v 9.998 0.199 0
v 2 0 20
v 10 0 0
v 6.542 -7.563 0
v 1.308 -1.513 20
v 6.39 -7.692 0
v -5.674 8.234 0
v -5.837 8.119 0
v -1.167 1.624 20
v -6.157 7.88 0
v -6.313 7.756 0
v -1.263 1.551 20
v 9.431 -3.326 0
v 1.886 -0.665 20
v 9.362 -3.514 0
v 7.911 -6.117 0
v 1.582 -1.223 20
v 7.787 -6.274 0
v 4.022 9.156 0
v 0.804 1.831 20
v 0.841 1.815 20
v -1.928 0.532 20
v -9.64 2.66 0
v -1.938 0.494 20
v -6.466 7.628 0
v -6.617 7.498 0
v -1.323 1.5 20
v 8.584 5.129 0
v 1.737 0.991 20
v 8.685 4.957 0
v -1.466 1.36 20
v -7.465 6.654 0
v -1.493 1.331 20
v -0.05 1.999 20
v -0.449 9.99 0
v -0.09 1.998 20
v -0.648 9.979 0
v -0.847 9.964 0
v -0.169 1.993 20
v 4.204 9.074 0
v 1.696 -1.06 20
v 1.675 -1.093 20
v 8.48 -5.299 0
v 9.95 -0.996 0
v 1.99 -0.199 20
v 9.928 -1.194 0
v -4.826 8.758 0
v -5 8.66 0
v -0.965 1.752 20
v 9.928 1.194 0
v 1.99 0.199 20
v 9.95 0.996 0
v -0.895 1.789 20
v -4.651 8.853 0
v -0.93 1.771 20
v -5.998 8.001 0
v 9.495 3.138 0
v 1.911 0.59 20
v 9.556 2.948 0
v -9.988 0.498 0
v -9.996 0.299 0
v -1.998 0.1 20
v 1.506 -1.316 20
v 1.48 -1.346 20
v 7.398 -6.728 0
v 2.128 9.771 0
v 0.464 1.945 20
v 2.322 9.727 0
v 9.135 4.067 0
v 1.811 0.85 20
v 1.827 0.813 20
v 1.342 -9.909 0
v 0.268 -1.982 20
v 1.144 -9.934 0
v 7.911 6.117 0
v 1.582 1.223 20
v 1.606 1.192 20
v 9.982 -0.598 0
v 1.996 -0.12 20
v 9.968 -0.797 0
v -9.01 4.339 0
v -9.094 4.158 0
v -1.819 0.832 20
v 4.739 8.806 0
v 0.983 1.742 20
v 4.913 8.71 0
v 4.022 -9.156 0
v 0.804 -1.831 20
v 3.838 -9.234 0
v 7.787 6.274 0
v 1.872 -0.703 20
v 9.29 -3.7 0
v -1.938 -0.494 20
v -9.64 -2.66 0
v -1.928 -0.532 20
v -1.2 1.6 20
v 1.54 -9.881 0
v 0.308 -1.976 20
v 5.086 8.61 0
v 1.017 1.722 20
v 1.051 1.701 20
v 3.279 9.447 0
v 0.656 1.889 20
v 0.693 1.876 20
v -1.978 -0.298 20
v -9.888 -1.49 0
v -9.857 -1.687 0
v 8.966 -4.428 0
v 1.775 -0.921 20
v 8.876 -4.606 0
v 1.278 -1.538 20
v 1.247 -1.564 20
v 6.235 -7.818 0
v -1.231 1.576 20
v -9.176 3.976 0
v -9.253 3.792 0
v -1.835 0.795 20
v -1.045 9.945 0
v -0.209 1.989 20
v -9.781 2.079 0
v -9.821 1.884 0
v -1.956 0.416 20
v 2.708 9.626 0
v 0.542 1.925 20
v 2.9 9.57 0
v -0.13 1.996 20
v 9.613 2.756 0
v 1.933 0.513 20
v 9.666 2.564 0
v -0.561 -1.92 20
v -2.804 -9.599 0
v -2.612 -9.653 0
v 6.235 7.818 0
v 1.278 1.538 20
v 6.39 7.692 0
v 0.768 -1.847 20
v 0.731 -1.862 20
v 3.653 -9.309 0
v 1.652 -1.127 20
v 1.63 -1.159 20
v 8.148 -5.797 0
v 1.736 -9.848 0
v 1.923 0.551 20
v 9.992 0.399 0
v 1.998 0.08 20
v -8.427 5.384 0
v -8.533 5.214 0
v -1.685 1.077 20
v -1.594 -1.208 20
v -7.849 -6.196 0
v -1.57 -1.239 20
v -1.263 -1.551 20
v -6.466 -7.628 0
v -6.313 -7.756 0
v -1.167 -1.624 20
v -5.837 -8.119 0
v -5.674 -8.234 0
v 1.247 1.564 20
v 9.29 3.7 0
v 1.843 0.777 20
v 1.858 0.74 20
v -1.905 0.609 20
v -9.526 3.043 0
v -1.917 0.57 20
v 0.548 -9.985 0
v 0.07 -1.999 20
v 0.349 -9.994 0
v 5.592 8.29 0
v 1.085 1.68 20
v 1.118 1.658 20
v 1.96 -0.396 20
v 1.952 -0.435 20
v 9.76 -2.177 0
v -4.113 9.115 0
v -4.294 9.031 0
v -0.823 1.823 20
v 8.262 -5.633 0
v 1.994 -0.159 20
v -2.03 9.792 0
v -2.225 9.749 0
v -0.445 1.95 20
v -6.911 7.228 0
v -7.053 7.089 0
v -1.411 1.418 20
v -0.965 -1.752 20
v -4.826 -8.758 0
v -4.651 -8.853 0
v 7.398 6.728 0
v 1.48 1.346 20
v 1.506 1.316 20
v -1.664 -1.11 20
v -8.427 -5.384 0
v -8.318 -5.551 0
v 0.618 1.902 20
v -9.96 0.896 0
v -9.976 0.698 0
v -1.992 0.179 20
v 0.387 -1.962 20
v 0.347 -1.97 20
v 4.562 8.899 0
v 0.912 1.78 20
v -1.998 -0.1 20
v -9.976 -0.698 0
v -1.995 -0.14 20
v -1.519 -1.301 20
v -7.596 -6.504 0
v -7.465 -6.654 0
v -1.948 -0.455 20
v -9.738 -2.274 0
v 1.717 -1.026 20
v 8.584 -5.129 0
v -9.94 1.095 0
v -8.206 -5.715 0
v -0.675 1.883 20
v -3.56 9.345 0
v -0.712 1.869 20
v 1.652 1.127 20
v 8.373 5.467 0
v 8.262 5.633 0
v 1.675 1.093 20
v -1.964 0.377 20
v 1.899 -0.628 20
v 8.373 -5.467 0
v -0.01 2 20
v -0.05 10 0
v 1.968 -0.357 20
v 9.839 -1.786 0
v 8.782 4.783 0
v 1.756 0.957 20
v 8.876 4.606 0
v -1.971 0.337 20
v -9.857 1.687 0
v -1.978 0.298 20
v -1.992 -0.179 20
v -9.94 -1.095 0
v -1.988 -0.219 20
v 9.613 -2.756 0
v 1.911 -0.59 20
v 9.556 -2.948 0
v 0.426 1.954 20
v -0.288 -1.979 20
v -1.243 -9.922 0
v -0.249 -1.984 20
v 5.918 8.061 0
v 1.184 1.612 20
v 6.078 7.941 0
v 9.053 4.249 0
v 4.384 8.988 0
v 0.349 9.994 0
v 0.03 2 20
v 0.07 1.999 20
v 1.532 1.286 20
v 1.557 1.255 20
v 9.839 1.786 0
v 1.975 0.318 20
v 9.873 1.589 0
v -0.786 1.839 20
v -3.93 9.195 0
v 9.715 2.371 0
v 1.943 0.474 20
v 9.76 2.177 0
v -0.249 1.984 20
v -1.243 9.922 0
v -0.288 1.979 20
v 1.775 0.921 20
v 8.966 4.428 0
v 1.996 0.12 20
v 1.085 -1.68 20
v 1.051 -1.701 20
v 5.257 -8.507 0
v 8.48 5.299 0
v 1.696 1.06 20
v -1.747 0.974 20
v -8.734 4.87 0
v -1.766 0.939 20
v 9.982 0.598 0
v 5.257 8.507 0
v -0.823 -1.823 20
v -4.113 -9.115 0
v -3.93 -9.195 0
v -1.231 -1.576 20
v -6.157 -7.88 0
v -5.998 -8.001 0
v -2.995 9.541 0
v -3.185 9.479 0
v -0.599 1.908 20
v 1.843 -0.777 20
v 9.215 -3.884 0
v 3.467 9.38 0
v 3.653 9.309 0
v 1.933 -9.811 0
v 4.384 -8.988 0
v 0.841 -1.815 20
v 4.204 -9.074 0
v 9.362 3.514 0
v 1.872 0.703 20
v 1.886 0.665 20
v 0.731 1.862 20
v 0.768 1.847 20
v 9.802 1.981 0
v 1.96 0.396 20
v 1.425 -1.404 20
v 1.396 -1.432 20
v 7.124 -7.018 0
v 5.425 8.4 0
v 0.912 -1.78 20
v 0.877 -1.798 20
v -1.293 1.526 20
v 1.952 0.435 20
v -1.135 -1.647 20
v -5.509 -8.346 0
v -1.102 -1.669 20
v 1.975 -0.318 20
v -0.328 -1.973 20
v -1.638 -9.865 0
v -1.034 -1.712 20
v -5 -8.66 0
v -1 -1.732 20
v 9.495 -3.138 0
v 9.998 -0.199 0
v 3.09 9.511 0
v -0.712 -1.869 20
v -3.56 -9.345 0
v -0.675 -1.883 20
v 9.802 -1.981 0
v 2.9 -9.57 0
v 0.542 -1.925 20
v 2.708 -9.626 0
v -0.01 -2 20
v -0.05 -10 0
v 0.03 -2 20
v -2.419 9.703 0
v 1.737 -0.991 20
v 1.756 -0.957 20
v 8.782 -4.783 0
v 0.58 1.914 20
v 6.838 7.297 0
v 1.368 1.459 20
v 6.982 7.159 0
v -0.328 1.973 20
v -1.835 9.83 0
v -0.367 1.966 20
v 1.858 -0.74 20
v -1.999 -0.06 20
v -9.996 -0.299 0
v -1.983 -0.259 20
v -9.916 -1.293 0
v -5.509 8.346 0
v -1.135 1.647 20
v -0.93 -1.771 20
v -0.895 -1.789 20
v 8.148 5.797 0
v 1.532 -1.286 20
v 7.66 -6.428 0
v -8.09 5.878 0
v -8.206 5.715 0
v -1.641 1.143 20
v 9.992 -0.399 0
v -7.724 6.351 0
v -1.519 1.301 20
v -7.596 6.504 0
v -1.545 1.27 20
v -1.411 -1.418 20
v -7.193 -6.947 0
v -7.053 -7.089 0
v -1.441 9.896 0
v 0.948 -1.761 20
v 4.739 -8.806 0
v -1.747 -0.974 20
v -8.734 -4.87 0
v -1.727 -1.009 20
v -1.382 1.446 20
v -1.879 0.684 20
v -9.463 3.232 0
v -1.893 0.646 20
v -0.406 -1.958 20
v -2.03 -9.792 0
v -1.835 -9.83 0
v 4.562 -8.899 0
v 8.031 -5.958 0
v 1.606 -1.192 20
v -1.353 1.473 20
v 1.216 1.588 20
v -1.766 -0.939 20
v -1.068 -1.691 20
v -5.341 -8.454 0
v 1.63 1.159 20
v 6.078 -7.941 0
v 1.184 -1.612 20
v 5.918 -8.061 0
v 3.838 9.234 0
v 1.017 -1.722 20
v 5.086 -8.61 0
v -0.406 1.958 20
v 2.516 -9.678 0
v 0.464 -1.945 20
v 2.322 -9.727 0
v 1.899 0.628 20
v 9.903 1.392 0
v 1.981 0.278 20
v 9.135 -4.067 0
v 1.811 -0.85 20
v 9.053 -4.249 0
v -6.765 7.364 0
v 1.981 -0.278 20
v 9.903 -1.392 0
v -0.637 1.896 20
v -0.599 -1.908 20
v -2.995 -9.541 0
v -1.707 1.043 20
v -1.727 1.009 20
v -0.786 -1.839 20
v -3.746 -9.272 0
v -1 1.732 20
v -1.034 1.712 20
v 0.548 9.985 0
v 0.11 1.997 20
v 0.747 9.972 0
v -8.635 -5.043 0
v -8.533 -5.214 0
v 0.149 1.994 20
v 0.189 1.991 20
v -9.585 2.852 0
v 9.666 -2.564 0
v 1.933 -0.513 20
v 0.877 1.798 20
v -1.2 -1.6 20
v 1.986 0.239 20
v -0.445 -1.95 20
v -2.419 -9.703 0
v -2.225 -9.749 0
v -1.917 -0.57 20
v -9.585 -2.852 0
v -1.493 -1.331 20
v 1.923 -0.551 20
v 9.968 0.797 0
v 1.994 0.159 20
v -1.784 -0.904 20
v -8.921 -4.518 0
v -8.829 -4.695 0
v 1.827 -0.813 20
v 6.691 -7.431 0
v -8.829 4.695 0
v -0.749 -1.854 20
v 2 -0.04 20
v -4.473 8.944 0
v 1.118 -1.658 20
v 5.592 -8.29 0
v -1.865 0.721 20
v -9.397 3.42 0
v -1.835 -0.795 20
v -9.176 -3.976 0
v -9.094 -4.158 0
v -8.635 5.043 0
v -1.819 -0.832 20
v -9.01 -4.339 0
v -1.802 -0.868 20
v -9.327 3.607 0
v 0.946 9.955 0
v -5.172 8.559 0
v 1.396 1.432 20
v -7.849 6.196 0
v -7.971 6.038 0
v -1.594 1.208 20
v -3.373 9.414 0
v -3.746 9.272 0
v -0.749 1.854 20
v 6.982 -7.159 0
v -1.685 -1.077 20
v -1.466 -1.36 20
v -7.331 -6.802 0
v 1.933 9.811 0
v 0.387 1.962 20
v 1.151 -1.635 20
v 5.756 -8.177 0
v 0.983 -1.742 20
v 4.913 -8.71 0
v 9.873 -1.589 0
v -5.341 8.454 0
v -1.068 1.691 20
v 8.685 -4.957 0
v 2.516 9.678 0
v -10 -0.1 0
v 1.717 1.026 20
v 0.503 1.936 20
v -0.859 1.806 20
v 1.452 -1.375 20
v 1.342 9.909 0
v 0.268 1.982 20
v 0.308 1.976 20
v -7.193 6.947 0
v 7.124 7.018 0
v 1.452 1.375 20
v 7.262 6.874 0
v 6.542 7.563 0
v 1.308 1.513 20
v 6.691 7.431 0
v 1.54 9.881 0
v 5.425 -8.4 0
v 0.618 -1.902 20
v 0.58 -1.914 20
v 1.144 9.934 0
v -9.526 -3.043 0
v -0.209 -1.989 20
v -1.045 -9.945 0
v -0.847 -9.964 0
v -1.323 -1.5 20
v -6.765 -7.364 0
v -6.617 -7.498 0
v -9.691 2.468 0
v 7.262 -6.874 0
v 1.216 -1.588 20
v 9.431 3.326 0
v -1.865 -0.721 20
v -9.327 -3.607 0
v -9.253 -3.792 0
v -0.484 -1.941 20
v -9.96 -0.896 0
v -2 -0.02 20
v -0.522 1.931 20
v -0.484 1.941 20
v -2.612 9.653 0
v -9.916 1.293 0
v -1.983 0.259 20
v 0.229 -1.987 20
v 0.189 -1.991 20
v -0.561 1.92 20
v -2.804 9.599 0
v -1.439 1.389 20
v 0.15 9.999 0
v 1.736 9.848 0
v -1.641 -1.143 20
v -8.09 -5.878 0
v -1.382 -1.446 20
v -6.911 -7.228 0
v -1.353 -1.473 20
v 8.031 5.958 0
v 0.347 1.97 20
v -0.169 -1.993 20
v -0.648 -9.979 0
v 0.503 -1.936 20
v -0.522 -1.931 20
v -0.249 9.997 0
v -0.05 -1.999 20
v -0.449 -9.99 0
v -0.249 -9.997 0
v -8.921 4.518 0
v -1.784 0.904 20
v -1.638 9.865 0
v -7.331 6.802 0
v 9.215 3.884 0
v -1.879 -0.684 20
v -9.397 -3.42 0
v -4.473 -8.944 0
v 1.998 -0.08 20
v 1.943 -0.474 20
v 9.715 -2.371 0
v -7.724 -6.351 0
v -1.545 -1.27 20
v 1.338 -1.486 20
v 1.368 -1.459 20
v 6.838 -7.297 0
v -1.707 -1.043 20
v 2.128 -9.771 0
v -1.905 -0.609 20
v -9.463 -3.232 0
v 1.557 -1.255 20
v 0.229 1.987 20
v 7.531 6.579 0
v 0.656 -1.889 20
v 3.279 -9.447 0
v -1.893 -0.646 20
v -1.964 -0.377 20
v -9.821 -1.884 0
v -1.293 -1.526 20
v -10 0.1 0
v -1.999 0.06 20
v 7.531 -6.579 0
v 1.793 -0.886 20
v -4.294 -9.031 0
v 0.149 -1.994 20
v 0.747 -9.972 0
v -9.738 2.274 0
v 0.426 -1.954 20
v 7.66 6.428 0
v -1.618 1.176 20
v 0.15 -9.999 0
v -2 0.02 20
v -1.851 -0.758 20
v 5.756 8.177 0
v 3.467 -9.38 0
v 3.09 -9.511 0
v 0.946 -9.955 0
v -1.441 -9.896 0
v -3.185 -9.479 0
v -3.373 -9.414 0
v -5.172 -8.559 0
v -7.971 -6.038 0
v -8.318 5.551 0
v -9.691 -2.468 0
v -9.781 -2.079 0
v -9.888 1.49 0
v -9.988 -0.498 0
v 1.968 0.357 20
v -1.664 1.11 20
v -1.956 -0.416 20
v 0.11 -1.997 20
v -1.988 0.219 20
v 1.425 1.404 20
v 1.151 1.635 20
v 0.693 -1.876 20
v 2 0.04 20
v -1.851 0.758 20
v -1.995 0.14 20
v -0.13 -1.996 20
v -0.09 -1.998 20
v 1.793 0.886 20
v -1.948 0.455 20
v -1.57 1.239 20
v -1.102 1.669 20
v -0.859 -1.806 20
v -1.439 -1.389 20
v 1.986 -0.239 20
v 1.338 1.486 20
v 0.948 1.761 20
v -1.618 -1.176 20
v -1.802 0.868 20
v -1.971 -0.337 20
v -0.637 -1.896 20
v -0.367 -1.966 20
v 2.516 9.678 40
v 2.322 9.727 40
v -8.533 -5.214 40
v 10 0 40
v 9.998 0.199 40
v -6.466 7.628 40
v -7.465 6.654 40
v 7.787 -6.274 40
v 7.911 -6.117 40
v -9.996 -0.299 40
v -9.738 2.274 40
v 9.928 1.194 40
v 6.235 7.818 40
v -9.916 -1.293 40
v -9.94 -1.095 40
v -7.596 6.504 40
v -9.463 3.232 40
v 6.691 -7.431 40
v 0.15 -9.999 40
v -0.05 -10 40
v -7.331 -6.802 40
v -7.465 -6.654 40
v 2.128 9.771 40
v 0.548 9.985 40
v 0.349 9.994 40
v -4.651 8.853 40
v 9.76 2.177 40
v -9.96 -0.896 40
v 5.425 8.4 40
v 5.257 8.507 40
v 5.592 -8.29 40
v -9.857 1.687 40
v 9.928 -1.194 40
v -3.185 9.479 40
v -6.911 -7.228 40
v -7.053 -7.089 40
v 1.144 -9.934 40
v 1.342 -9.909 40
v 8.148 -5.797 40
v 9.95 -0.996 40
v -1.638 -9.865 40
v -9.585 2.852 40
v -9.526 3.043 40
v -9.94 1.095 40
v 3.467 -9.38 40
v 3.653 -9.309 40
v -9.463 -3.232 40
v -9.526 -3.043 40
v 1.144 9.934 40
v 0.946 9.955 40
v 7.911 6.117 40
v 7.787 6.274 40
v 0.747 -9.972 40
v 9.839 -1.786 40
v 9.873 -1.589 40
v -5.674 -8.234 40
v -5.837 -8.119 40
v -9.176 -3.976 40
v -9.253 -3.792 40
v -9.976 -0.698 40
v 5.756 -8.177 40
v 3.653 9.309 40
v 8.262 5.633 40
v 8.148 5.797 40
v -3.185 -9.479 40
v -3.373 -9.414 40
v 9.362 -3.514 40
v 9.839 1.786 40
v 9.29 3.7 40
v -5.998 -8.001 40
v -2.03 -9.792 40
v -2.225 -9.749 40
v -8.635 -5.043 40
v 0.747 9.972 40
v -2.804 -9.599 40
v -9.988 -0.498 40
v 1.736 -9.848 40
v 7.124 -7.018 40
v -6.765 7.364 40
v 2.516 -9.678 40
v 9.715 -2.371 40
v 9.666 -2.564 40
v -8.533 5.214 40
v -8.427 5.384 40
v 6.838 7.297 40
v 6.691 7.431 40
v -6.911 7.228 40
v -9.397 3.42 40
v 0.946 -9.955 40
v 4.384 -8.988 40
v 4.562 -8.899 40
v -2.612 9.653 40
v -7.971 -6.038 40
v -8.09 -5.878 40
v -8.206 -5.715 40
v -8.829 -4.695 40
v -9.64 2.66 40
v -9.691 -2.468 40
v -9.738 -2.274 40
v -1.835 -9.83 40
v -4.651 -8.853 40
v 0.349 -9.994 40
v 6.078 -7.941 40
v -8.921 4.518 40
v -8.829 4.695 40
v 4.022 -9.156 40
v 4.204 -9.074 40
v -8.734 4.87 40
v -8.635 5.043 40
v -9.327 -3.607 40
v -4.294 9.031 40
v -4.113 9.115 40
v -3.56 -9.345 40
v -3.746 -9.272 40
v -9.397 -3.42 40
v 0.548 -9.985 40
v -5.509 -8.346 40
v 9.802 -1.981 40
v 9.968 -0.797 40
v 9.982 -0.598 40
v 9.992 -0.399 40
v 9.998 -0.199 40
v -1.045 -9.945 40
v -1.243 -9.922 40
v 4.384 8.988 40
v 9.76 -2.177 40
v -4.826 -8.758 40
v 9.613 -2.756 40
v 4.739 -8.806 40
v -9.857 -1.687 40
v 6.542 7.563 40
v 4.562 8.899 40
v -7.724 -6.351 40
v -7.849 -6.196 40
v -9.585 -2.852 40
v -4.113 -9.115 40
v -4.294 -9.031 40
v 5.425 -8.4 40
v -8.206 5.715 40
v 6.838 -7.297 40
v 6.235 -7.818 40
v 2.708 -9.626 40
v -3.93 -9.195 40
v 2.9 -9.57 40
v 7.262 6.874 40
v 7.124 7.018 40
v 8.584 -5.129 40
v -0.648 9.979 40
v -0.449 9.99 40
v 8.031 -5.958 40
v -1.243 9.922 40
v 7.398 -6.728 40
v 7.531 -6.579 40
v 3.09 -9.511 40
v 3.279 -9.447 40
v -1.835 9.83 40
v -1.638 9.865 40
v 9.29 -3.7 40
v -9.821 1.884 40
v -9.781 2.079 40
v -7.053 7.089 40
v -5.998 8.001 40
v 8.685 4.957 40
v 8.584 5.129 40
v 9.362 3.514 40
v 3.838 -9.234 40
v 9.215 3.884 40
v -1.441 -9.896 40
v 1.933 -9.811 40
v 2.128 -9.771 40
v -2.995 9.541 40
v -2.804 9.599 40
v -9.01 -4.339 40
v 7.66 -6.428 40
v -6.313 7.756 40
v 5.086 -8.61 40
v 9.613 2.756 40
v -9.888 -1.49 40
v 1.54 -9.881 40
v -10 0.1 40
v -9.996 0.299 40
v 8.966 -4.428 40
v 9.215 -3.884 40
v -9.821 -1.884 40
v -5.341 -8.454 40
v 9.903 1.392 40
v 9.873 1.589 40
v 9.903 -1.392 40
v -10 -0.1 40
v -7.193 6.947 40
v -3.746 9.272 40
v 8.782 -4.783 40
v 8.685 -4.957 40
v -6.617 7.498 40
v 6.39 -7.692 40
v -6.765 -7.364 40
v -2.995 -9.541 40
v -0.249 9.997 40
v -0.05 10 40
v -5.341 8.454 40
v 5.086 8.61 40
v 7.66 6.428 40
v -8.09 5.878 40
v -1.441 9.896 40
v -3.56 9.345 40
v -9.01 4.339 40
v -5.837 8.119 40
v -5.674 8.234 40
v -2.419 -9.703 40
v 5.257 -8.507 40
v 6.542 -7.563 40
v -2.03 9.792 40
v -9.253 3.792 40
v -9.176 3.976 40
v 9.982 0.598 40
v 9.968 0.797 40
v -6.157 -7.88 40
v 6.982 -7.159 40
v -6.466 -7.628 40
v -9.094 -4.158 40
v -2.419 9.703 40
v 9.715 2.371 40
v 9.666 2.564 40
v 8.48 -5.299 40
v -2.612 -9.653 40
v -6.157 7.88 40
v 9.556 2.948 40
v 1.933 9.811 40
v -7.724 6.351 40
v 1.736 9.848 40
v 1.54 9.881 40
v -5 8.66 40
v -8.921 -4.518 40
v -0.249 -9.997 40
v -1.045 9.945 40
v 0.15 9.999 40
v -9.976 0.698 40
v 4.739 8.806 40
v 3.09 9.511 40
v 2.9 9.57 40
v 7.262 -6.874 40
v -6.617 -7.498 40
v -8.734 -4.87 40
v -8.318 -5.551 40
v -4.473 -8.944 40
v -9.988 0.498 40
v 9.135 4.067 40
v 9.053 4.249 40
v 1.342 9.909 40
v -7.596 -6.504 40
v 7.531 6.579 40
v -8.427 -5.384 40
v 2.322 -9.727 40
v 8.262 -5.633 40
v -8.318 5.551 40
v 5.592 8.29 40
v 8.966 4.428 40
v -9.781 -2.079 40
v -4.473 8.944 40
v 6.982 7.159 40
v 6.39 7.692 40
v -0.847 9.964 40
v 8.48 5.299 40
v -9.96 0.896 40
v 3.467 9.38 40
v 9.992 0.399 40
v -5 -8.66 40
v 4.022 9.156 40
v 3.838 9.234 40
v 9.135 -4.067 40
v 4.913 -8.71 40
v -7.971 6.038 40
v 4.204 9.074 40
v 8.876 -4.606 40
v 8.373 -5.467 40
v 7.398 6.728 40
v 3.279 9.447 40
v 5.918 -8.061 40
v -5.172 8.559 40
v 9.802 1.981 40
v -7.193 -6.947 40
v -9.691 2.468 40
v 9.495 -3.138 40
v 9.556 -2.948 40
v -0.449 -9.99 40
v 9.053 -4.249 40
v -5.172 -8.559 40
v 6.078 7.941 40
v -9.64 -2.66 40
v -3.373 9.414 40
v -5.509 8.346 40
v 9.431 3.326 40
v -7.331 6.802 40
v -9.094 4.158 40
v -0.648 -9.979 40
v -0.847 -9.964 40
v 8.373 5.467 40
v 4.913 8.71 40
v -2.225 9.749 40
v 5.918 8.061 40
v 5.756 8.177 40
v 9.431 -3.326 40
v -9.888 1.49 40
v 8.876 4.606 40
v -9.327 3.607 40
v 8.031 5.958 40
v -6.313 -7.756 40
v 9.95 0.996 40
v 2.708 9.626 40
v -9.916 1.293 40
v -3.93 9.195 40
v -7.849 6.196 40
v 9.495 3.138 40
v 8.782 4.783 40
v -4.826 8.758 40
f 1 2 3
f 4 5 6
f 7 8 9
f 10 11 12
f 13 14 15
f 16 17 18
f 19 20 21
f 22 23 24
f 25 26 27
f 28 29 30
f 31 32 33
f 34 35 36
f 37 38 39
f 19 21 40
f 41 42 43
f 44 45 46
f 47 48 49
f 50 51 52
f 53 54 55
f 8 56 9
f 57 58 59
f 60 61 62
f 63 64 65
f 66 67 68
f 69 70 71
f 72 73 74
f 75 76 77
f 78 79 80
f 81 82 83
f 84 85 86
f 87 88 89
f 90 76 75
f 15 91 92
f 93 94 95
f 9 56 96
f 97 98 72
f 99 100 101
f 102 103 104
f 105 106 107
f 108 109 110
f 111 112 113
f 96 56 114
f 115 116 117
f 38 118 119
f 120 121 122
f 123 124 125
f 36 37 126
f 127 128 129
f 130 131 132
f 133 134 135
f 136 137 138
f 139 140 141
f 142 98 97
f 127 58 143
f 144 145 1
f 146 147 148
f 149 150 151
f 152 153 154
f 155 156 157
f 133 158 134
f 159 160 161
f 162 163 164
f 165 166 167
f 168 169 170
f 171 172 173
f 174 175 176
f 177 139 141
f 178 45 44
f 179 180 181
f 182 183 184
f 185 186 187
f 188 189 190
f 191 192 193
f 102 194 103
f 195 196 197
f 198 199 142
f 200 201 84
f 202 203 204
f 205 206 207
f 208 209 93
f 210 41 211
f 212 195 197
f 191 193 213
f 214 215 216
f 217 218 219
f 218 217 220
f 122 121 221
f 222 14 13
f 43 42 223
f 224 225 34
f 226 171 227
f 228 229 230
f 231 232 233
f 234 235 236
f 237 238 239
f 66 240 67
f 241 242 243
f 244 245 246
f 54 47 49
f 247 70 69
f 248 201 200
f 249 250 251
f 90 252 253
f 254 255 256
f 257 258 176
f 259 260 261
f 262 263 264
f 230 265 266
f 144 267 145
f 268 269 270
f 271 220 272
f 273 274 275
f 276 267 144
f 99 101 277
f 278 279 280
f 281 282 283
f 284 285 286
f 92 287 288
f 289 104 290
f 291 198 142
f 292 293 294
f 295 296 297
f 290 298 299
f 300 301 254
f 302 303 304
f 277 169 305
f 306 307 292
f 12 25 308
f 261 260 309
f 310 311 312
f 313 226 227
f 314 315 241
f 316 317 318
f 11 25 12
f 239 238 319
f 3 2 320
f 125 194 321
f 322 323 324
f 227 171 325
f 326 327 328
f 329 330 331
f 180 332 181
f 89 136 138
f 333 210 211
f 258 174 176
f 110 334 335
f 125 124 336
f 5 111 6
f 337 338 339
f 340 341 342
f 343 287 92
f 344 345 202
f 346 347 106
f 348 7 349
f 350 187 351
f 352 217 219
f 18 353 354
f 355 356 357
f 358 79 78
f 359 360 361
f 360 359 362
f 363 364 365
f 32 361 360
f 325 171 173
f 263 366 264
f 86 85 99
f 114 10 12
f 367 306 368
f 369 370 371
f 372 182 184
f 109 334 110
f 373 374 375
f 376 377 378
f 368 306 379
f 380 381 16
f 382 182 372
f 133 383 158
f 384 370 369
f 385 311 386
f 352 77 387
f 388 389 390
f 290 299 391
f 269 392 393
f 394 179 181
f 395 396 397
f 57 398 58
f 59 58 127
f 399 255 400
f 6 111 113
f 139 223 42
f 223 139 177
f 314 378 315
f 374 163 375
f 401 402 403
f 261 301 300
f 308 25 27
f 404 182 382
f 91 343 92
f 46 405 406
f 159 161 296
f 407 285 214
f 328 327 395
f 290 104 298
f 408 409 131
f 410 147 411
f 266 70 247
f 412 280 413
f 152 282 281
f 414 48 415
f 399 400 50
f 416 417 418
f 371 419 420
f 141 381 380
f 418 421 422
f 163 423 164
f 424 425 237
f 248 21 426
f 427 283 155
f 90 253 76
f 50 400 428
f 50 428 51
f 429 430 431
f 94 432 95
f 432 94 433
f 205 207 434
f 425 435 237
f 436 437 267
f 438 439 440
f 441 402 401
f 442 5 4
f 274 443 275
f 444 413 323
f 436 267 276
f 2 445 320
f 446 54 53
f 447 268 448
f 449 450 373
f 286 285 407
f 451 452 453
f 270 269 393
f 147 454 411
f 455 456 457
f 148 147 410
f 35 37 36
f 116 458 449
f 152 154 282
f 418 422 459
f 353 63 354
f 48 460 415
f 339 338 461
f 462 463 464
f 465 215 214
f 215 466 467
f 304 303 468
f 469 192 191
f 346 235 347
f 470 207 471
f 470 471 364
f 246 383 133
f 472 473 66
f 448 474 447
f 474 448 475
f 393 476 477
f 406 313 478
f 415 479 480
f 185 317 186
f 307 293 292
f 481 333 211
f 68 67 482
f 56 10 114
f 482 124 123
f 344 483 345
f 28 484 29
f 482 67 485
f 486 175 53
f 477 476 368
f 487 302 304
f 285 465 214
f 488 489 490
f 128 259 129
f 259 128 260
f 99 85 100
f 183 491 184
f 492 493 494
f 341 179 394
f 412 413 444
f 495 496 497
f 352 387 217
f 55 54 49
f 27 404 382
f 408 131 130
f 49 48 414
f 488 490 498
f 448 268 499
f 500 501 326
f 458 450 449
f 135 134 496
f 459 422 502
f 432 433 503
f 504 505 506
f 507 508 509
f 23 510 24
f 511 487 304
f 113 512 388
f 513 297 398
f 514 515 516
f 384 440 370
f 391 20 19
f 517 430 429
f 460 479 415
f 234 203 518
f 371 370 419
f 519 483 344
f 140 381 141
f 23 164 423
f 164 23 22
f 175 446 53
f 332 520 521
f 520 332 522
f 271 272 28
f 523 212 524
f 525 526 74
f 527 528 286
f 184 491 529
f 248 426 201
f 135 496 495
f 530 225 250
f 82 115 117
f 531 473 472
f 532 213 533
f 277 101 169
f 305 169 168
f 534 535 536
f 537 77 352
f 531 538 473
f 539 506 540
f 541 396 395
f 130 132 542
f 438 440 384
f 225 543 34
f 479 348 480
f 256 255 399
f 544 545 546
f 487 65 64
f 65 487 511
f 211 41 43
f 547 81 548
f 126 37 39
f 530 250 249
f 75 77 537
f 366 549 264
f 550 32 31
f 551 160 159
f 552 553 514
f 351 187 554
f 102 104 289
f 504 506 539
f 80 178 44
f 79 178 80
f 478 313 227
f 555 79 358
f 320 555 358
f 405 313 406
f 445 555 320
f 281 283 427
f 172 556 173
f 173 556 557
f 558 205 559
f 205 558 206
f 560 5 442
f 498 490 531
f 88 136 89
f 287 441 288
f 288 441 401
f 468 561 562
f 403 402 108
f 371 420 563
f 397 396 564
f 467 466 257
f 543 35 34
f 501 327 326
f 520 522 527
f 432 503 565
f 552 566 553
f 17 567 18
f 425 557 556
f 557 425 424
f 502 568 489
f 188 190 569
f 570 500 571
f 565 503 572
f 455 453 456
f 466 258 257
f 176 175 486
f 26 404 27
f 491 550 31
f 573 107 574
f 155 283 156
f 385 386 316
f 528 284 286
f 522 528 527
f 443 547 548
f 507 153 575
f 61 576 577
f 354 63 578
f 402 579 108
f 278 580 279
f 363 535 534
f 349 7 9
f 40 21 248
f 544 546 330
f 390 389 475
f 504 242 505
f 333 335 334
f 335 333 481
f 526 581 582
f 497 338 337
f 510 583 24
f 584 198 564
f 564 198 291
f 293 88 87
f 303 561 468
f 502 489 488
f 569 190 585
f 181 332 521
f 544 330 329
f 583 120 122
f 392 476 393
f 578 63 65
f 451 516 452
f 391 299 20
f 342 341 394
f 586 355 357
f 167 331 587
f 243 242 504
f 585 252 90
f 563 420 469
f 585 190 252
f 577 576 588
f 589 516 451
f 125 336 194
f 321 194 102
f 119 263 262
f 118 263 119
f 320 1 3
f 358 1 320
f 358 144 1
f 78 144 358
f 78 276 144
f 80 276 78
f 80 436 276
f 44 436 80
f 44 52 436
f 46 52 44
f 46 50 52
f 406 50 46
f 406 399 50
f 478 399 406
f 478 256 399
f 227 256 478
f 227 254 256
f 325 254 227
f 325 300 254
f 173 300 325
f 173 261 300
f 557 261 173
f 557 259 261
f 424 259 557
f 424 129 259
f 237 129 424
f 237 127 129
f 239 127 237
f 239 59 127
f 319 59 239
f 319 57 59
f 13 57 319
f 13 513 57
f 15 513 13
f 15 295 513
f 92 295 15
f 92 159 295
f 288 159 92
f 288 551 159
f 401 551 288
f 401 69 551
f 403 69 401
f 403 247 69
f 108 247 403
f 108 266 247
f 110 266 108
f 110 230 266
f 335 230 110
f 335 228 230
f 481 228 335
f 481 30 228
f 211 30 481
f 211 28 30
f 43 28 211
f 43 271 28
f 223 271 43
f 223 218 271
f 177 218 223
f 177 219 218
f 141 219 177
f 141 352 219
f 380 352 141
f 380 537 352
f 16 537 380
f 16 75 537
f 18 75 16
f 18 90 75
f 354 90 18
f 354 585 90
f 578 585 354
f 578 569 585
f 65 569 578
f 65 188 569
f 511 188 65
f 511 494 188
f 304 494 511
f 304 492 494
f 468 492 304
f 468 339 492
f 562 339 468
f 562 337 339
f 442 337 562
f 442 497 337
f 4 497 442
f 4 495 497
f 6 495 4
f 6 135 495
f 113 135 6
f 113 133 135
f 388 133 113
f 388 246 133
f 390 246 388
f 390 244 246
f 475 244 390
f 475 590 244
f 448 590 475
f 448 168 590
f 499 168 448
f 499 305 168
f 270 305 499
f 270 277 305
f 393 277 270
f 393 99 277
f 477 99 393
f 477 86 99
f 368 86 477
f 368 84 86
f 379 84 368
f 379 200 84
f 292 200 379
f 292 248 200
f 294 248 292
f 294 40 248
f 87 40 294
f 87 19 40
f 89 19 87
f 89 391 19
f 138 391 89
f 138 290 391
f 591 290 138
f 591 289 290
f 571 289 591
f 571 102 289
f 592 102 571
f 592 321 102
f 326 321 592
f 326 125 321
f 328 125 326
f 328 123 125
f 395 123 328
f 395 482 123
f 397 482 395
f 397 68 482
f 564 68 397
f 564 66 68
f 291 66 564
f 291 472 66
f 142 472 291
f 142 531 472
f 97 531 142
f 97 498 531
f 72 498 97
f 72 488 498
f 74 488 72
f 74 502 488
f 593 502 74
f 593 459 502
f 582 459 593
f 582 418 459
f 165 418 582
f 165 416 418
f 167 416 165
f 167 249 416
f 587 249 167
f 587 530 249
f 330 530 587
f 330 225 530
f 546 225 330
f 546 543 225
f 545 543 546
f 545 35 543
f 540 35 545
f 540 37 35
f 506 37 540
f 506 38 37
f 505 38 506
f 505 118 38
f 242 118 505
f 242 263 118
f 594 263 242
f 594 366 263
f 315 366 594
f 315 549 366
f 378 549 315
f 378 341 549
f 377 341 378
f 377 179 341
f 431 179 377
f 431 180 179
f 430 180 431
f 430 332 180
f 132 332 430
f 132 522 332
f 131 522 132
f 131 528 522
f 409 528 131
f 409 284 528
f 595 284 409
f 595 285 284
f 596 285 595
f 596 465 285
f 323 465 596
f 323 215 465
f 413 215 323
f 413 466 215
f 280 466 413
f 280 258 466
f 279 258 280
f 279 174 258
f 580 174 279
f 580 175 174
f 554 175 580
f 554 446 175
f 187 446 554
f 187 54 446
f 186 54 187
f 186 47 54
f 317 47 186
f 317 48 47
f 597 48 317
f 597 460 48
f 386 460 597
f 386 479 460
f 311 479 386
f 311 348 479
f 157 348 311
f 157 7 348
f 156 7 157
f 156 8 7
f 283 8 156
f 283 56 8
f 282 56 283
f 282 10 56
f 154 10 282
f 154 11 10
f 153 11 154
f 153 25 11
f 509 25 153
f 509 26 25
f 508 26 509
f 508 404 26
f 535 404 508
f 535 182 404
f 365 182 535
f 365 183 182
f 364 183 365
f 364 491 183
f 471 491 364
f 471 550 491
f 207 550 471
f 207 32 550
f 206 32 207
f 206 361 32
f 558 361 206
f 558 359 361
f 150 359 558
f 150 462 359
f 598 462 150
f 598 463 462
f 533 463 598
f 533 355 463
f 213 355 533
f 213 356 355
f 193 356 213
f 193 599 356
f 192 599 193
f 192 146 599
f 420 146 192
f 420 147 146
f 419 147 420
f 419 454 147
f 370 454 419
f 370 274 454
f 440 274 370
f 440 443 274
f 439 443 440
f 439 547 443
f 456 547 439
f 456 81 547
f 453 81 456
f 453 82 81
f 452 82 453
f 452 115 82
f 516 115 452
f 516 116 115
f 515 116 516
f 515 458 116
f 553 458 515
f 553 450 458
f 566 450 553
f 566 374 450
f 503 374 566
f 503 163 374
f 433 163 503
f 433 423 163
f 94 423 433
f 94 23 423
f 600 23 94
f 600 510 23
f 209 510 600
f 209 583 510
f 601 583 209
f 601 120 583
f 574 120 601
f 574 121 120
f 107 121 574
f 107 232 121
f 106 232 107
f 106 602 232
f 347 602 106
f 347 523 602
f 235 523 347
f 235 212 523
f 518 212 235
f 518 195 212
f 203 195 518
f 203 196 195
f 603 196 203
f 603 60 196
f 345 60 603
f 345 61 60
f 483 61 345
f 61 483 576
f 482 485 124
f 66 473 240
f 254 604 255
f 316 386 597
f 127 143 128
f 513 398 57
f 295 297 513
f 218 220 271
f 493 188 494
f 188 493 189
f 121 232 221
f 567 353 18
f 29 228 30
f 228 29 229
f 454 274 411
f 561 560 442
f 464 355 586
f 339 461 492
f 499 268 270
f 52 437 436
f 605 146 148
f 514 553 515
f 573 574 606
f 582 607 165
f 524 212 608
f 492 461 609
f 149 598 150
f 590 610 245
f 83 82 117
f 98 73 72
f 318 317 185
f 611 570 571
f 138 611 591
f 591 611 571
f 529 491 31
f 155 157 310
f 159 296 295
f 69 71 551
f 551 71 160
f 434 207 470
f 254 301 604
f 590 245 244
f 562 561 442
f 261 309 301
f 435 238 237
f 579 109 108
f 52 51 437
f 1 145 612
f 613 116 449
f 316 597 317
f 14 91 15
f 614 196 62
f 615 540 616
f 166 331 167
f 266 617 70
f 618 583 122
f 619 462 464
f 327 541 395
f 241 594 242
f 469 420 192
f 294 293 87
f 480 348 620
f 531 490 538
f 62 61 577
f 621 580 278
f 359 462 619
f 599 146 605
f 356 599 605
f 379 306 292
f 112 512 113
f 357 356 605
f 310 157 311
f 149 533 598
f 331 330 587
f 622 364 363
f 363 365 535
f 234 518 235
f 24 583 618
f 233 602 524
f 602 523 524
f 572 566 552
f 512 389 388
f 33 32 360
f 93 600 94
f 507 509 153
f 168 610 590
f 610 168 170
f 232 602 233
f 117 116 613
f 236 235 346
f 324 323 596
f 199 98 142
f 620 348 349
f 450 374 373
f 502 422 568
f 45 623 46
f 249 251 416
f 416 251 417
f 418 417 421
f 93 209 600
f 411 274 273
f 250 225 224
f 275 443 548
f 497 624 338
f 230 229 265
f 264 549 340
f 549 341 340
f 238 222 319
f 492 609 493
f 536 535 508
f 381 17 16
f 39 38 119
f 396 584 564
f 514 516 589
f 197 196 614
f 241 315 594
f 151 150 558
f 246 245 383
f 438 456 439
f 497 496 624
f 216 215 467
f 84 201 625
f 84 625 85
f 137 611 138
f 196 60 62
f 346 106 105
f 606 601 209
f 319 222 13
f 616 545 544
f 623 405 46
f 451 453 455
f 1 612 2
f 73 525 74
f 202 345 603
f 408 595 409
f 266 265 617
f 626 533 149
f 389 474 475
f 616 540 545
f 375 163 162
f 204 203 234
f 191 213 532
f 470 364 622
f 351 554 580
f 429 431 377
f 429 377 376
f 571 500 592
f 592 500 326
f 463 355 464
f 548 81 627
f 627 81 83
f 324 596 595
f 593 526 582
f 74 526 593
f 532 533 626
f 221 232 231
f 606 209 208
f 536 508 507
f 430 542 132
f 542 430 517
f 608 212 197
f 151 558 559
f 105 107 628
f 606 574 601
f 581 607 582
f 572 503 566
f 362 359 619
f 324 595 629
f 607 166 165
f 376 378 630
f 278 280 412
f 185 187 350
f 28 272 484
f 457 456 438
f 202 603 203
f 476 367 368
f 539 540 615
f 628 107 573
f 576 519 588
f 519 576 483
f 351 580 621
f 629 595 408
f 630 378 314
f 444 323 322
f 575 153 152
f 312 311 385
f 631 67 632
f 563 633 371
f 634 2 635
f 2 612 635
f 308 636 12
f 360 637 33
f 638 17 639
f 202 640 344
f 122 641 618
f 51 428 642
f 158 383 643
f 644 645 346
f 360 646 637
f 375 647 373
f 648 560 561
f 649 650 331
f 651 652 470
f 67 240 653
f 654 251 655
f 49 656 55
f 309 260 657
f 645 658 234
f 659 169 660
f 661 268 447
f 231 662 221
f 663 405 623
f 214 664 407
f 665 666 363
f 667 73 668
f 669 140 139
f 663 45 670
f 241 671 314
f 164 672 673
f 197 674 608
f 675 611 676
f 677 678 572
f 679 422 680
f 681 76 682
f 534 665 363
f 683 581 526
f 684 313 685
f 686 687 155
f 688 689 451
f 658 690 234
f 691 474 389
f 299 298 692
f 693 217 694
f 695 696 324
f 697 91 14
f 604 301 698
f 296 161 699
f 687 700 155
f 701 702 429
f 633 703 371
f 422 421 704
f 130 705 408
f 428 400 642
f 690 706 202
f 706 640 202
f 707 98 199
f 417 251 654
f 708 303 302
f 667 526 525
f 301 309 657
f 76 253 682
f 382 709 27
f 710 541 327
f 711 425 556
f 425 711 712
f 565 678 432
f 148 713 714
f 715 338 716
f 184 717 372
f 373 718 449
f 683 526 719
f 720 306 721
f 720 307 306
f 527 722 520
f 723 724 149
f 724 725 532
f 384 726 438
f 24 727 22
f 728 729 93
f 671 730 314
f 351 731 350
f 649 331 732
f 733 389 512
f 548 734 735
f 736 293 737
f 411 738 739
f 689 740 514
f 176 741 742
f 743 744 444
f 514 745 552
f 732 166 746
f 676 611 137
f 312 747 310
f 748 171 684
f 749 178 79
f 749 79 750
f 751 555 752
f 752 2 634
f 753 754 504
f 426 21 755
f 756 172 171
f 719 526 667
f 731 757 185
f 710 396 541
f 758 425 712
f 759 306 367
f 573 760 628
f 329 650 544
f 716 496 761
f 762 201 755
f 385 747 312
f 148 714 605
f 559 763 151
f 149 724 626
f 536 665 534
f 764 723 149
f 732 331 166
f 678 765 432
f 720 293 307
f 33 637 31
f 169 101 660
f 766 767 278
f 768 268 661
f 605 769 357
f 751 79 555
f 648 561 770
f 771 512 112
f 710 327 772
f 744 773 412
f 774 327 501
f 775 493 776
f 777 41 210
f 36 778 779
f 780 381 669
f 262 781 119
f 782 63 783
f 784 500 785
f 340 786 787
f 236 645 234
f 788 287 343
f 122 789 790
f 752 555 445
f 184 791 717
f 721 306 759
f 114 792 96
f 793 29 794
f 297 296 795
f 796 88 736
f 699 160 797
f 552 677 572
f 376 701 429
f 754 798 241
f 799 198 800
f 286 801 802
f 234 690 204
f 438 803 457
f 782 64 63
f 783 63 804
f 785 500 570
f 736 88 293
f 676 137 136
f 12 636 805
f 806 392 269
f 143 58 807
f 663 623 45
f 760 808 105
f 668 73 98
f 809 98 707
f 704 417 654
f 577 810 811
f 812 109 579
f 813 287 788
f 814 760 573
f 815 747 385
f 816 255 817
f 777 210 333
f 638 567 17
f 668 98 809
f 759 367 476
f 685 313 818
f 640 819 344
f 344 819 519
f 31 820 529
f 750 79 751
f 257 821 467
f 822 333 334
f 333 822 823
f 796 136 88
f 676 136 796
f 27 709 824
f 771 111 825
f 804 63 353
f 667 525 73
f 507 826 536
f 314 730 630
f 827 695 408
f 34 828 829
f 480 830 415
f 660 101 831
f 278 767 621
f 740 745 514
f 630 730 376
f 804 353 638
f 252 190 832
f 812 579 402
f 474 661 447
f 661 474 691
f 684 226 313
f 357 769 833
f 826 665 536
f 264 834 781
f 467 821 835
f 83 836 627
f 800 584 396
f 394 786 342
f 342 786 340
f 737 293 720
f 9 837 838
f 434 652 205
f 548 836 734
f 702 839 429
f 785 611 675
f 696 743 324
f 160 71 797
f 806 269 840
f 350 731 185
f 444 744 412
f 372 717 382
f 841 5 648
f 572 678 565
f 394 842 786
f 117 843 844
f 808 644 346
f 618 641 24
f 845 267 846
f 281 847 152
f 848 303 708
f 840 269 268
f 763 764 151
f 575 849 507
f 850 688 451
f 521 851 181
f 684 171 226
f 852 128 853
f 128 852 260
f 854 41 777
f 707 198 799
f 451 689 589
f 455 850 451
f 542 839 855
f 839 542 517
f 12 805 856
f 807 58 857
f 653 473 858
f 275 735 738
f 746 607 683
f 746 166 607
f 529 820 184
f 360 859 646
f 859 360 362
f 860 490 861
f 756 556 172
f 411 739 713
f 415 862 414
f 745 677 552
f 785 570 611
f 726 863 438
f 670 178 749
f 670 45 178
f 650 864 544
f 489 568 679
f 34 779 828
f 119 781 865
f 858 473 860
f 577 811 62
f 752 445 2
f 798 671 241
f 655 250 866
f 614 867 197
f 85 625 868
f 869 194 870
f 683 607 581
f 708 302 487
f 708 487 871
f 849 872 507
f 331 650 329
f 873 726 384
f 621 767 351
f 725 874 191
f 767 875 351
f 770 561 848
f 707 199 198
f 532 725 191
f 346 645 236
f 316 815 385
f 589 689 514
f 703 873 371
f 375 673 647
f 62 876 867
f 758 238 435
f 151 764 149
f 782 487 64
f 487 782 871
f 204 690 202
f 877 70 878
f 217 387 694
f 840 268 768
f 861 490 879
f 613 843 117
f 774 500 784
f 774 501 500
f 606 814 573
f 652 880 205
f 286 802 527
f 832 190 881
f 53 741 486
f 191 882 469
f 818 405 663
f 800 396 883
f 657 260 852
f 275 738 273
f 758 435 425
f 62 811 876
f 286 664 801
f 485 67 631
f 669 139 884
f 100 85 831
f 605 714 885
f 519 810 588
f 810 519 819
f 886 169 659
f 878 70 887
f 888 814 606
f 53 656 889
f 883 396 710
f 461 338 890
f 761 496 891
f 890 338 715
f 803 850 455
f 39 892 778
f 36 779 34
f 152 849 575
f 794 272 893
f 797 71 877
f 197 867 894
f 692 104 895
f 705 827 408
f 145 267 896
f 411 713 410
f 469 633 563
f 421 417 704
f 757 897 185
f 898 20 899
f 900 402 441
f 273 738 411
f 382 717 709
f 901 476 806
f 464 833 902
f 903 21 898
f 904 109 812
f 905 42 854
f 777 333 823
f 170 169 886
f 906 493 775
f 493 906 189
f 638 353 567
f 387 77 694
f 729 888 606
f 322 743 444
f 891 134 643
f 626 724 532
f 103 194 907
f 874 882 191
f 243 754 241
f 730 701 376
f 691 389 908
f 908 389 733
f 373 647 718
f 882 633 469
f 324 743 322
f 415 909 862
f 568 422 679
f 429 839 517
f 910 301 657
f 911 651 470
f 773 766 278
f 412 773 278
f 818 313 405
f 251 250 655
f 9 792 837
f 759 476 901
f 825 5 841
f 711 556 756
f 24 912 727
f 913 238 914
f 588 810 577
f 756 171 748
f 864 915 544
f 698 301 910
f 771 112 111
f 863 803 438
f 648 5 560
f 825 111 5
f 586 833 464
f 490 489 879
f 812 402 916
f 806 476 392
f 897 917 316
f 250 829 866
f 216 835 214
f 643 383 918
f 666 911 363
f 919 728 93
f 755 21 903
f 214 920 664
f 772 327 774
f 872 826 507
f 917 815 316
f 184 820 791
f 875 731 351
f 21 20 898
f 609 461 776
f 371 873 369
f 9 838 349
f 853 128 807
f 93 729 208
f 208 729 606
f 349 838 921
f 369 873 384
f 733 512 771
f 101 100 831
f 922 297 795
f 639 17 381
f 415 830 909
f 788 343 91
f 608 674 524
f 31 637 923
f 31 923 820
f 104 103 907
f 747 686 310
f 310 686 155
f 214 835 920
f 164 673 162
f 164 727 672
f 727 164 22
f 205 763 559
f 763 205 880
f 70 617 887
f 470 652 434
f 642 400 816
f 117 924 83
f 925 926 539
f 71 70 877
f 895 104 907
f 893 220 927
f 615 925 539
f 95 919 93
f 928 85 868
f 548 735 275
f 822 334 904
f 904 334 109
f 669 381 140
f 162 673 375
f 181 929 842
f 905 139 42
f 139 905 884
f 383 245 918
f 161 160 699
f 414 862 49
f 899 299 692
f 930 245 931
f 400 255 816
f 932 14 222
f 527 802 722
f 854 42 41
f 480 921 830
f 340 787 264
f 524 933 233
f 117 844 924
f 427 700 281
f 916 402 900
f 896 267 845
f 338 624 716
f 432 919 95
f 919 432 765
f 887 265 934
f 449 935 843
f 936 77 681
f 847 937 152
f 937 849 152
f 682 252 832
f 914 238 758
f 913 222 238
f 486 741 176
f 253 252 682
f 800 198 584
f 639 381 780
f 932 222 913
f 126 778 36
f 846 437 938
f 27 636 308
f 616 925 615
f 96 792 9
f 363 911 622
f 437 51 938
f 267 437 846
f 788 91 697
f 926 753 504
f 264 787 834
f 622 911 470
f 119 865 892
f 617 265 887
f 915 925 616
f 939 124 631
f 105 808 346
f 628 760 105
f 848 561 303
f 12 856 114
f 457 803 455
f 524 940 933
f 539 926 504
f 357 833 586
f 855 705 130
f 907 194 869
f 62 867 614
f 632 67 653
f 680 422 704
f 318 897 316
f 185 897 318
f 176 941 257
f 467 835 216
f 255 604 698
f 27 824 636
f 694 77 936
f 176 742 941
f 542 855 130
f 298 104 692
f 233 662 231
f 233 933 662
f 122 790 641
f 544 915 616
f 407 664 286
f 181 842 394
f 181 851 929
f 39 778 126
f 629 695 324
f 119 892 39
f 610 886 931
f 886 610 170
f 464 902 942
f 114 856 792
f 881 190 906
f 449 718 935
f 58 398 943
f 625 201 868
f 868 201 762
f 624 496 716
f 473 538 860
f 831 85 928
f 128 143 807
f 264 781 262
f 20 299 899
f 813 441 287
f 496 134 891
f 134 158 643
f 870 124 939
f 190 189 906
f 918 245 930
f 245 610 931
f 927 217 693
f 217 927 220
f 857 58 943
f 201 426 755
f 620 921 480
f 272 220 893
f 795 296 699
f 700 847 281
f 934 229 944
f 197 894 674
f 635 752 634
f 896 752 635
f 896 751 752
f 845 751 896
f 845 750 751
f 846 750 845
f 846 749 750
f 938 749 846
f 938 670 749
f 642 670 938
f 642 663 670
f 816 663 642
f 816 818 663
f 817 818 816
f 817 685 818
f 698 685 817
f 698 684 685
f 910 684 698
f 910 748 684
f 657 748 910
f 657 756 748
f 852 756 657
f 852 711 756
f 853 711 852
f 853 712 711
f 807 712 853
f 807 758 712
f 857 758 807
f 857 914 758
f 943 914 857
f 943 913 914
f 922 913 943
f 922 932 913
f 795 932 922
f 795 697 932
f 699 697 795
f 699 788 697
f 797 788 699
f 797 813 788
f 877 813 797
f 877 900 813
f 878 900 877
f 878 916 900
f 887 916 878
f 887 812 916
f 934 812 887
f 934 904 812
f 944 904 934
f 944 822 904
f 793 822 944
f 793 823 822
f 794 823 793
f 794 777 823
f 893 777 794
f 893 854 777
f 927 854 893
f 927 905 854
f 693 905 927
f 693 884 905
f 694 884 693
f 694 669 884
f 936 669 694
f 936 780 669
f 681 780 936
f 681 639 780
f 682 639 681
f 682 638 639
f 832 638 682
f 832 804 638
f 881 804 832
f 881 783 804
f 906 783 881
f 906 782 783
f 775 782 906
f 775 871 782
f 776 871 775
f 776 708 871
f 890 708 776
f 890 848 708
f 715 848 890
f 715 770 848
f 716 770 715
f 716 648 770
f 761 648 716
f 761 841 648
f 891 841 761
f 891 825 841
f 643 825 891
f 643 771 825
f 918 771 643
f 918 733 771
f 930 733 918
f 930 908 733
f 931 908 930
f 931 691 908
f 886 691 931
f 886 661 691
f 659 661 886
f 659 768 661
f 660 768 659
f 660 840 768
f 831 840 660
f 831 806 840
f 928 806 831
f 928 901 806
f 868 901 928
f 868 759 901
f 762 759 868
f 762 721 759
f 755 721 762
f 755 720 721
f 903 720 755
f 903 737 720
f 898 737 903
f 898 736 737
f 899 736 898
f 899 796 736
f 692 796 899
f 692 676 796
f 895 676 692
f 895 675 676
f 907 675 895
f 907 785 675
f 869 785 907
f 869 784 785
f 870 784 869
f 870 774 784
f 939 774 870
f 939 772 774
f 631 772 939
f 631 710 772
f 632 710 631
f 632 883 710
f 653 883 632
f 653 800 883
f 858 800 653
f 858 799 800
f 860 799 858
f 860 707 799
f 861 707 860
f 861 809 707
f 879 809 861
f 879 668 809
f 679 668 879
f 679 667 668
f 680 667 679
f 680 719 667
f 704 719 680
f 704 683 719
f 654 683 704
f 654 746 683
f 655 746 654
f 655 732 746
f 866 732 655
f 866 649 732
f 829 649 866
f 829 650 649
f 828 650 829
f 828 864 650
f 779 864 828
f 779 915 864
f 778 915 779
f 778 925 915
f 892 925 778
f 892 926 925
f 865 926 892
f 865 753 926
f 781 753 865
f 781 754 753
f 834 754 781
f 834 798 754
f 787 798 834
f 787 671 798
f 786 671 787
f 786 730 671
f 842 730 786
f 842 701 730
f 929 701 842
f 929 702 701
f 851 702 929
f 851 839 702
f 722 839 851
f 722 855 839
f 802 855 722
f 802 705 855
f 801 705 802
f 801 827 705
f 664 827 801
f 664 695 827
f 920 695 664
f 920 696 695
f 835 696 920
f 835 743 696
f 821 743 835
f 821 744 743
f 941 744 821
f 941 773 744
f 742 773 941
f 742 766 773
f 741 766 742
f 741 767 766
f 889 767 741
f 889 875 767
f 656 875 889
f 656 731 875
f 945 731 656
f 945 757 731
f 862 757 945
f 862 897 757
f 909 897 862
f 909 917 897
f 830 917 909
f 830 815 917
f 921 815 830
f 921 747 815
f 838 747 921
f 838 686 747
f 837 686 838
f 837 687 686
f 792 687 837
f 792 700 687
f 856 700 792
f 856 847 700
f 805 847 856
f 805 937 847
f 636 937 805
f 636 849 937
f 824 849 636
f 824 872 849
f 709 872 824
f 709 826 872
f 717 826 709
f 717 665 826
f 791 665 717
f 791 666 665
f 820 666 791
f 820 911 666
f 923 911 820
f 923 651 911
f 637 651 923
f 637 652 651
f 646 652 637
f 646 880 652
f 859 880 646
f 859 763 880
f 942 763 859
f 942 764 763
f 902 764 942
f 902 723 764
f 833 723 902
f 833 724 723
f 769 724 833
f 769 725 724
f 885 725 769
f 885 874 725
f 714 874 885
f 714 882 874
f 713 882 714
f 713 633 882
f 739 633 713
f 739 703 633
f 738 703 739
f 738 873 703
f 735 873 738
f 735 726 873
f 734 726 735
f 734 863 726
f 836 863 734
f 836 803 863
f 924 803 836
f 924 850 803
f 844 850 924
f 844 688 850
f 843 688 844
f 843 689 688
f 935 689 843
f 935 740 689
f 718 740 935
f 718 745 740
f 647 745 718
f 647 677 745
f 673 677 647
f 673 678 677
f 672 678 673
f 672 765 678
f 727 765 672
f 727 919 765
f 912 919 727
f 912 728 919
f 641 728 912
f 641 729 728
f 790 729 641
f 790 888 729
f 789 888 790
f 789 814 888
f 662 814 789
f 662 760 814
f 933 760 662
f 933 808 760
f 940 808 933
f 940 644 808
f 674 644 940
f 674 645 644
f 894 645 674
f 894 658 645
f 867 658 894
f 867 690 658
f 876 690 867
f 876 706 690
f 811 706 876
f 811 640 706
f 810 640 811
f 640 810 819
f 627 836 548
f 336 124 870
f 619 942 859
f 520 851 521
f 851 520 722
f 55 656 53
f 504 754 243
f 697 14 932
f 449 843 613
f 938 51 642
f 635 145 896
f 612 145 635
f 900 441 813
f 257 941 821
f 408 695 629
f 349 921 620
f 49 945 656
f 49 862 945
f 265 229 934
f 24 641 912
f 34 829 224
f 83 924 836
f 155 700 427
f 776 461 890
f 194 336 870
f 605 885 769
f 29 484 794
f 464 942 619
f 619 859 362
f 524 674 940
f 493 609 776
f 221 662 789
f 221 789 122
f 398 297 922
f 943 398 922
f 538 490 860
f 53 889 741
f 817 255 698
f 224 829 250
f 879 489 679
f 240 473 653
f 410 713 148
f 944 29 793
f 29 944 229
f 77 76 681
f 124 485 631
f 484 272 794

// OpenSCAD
$fs = 0.2;
$fa = 1;

cylinder(r1=10, r2=2, h=20);
translate([0, 0, 20]) {
	cylinder(r1=2, r2=10, h=20);
}
